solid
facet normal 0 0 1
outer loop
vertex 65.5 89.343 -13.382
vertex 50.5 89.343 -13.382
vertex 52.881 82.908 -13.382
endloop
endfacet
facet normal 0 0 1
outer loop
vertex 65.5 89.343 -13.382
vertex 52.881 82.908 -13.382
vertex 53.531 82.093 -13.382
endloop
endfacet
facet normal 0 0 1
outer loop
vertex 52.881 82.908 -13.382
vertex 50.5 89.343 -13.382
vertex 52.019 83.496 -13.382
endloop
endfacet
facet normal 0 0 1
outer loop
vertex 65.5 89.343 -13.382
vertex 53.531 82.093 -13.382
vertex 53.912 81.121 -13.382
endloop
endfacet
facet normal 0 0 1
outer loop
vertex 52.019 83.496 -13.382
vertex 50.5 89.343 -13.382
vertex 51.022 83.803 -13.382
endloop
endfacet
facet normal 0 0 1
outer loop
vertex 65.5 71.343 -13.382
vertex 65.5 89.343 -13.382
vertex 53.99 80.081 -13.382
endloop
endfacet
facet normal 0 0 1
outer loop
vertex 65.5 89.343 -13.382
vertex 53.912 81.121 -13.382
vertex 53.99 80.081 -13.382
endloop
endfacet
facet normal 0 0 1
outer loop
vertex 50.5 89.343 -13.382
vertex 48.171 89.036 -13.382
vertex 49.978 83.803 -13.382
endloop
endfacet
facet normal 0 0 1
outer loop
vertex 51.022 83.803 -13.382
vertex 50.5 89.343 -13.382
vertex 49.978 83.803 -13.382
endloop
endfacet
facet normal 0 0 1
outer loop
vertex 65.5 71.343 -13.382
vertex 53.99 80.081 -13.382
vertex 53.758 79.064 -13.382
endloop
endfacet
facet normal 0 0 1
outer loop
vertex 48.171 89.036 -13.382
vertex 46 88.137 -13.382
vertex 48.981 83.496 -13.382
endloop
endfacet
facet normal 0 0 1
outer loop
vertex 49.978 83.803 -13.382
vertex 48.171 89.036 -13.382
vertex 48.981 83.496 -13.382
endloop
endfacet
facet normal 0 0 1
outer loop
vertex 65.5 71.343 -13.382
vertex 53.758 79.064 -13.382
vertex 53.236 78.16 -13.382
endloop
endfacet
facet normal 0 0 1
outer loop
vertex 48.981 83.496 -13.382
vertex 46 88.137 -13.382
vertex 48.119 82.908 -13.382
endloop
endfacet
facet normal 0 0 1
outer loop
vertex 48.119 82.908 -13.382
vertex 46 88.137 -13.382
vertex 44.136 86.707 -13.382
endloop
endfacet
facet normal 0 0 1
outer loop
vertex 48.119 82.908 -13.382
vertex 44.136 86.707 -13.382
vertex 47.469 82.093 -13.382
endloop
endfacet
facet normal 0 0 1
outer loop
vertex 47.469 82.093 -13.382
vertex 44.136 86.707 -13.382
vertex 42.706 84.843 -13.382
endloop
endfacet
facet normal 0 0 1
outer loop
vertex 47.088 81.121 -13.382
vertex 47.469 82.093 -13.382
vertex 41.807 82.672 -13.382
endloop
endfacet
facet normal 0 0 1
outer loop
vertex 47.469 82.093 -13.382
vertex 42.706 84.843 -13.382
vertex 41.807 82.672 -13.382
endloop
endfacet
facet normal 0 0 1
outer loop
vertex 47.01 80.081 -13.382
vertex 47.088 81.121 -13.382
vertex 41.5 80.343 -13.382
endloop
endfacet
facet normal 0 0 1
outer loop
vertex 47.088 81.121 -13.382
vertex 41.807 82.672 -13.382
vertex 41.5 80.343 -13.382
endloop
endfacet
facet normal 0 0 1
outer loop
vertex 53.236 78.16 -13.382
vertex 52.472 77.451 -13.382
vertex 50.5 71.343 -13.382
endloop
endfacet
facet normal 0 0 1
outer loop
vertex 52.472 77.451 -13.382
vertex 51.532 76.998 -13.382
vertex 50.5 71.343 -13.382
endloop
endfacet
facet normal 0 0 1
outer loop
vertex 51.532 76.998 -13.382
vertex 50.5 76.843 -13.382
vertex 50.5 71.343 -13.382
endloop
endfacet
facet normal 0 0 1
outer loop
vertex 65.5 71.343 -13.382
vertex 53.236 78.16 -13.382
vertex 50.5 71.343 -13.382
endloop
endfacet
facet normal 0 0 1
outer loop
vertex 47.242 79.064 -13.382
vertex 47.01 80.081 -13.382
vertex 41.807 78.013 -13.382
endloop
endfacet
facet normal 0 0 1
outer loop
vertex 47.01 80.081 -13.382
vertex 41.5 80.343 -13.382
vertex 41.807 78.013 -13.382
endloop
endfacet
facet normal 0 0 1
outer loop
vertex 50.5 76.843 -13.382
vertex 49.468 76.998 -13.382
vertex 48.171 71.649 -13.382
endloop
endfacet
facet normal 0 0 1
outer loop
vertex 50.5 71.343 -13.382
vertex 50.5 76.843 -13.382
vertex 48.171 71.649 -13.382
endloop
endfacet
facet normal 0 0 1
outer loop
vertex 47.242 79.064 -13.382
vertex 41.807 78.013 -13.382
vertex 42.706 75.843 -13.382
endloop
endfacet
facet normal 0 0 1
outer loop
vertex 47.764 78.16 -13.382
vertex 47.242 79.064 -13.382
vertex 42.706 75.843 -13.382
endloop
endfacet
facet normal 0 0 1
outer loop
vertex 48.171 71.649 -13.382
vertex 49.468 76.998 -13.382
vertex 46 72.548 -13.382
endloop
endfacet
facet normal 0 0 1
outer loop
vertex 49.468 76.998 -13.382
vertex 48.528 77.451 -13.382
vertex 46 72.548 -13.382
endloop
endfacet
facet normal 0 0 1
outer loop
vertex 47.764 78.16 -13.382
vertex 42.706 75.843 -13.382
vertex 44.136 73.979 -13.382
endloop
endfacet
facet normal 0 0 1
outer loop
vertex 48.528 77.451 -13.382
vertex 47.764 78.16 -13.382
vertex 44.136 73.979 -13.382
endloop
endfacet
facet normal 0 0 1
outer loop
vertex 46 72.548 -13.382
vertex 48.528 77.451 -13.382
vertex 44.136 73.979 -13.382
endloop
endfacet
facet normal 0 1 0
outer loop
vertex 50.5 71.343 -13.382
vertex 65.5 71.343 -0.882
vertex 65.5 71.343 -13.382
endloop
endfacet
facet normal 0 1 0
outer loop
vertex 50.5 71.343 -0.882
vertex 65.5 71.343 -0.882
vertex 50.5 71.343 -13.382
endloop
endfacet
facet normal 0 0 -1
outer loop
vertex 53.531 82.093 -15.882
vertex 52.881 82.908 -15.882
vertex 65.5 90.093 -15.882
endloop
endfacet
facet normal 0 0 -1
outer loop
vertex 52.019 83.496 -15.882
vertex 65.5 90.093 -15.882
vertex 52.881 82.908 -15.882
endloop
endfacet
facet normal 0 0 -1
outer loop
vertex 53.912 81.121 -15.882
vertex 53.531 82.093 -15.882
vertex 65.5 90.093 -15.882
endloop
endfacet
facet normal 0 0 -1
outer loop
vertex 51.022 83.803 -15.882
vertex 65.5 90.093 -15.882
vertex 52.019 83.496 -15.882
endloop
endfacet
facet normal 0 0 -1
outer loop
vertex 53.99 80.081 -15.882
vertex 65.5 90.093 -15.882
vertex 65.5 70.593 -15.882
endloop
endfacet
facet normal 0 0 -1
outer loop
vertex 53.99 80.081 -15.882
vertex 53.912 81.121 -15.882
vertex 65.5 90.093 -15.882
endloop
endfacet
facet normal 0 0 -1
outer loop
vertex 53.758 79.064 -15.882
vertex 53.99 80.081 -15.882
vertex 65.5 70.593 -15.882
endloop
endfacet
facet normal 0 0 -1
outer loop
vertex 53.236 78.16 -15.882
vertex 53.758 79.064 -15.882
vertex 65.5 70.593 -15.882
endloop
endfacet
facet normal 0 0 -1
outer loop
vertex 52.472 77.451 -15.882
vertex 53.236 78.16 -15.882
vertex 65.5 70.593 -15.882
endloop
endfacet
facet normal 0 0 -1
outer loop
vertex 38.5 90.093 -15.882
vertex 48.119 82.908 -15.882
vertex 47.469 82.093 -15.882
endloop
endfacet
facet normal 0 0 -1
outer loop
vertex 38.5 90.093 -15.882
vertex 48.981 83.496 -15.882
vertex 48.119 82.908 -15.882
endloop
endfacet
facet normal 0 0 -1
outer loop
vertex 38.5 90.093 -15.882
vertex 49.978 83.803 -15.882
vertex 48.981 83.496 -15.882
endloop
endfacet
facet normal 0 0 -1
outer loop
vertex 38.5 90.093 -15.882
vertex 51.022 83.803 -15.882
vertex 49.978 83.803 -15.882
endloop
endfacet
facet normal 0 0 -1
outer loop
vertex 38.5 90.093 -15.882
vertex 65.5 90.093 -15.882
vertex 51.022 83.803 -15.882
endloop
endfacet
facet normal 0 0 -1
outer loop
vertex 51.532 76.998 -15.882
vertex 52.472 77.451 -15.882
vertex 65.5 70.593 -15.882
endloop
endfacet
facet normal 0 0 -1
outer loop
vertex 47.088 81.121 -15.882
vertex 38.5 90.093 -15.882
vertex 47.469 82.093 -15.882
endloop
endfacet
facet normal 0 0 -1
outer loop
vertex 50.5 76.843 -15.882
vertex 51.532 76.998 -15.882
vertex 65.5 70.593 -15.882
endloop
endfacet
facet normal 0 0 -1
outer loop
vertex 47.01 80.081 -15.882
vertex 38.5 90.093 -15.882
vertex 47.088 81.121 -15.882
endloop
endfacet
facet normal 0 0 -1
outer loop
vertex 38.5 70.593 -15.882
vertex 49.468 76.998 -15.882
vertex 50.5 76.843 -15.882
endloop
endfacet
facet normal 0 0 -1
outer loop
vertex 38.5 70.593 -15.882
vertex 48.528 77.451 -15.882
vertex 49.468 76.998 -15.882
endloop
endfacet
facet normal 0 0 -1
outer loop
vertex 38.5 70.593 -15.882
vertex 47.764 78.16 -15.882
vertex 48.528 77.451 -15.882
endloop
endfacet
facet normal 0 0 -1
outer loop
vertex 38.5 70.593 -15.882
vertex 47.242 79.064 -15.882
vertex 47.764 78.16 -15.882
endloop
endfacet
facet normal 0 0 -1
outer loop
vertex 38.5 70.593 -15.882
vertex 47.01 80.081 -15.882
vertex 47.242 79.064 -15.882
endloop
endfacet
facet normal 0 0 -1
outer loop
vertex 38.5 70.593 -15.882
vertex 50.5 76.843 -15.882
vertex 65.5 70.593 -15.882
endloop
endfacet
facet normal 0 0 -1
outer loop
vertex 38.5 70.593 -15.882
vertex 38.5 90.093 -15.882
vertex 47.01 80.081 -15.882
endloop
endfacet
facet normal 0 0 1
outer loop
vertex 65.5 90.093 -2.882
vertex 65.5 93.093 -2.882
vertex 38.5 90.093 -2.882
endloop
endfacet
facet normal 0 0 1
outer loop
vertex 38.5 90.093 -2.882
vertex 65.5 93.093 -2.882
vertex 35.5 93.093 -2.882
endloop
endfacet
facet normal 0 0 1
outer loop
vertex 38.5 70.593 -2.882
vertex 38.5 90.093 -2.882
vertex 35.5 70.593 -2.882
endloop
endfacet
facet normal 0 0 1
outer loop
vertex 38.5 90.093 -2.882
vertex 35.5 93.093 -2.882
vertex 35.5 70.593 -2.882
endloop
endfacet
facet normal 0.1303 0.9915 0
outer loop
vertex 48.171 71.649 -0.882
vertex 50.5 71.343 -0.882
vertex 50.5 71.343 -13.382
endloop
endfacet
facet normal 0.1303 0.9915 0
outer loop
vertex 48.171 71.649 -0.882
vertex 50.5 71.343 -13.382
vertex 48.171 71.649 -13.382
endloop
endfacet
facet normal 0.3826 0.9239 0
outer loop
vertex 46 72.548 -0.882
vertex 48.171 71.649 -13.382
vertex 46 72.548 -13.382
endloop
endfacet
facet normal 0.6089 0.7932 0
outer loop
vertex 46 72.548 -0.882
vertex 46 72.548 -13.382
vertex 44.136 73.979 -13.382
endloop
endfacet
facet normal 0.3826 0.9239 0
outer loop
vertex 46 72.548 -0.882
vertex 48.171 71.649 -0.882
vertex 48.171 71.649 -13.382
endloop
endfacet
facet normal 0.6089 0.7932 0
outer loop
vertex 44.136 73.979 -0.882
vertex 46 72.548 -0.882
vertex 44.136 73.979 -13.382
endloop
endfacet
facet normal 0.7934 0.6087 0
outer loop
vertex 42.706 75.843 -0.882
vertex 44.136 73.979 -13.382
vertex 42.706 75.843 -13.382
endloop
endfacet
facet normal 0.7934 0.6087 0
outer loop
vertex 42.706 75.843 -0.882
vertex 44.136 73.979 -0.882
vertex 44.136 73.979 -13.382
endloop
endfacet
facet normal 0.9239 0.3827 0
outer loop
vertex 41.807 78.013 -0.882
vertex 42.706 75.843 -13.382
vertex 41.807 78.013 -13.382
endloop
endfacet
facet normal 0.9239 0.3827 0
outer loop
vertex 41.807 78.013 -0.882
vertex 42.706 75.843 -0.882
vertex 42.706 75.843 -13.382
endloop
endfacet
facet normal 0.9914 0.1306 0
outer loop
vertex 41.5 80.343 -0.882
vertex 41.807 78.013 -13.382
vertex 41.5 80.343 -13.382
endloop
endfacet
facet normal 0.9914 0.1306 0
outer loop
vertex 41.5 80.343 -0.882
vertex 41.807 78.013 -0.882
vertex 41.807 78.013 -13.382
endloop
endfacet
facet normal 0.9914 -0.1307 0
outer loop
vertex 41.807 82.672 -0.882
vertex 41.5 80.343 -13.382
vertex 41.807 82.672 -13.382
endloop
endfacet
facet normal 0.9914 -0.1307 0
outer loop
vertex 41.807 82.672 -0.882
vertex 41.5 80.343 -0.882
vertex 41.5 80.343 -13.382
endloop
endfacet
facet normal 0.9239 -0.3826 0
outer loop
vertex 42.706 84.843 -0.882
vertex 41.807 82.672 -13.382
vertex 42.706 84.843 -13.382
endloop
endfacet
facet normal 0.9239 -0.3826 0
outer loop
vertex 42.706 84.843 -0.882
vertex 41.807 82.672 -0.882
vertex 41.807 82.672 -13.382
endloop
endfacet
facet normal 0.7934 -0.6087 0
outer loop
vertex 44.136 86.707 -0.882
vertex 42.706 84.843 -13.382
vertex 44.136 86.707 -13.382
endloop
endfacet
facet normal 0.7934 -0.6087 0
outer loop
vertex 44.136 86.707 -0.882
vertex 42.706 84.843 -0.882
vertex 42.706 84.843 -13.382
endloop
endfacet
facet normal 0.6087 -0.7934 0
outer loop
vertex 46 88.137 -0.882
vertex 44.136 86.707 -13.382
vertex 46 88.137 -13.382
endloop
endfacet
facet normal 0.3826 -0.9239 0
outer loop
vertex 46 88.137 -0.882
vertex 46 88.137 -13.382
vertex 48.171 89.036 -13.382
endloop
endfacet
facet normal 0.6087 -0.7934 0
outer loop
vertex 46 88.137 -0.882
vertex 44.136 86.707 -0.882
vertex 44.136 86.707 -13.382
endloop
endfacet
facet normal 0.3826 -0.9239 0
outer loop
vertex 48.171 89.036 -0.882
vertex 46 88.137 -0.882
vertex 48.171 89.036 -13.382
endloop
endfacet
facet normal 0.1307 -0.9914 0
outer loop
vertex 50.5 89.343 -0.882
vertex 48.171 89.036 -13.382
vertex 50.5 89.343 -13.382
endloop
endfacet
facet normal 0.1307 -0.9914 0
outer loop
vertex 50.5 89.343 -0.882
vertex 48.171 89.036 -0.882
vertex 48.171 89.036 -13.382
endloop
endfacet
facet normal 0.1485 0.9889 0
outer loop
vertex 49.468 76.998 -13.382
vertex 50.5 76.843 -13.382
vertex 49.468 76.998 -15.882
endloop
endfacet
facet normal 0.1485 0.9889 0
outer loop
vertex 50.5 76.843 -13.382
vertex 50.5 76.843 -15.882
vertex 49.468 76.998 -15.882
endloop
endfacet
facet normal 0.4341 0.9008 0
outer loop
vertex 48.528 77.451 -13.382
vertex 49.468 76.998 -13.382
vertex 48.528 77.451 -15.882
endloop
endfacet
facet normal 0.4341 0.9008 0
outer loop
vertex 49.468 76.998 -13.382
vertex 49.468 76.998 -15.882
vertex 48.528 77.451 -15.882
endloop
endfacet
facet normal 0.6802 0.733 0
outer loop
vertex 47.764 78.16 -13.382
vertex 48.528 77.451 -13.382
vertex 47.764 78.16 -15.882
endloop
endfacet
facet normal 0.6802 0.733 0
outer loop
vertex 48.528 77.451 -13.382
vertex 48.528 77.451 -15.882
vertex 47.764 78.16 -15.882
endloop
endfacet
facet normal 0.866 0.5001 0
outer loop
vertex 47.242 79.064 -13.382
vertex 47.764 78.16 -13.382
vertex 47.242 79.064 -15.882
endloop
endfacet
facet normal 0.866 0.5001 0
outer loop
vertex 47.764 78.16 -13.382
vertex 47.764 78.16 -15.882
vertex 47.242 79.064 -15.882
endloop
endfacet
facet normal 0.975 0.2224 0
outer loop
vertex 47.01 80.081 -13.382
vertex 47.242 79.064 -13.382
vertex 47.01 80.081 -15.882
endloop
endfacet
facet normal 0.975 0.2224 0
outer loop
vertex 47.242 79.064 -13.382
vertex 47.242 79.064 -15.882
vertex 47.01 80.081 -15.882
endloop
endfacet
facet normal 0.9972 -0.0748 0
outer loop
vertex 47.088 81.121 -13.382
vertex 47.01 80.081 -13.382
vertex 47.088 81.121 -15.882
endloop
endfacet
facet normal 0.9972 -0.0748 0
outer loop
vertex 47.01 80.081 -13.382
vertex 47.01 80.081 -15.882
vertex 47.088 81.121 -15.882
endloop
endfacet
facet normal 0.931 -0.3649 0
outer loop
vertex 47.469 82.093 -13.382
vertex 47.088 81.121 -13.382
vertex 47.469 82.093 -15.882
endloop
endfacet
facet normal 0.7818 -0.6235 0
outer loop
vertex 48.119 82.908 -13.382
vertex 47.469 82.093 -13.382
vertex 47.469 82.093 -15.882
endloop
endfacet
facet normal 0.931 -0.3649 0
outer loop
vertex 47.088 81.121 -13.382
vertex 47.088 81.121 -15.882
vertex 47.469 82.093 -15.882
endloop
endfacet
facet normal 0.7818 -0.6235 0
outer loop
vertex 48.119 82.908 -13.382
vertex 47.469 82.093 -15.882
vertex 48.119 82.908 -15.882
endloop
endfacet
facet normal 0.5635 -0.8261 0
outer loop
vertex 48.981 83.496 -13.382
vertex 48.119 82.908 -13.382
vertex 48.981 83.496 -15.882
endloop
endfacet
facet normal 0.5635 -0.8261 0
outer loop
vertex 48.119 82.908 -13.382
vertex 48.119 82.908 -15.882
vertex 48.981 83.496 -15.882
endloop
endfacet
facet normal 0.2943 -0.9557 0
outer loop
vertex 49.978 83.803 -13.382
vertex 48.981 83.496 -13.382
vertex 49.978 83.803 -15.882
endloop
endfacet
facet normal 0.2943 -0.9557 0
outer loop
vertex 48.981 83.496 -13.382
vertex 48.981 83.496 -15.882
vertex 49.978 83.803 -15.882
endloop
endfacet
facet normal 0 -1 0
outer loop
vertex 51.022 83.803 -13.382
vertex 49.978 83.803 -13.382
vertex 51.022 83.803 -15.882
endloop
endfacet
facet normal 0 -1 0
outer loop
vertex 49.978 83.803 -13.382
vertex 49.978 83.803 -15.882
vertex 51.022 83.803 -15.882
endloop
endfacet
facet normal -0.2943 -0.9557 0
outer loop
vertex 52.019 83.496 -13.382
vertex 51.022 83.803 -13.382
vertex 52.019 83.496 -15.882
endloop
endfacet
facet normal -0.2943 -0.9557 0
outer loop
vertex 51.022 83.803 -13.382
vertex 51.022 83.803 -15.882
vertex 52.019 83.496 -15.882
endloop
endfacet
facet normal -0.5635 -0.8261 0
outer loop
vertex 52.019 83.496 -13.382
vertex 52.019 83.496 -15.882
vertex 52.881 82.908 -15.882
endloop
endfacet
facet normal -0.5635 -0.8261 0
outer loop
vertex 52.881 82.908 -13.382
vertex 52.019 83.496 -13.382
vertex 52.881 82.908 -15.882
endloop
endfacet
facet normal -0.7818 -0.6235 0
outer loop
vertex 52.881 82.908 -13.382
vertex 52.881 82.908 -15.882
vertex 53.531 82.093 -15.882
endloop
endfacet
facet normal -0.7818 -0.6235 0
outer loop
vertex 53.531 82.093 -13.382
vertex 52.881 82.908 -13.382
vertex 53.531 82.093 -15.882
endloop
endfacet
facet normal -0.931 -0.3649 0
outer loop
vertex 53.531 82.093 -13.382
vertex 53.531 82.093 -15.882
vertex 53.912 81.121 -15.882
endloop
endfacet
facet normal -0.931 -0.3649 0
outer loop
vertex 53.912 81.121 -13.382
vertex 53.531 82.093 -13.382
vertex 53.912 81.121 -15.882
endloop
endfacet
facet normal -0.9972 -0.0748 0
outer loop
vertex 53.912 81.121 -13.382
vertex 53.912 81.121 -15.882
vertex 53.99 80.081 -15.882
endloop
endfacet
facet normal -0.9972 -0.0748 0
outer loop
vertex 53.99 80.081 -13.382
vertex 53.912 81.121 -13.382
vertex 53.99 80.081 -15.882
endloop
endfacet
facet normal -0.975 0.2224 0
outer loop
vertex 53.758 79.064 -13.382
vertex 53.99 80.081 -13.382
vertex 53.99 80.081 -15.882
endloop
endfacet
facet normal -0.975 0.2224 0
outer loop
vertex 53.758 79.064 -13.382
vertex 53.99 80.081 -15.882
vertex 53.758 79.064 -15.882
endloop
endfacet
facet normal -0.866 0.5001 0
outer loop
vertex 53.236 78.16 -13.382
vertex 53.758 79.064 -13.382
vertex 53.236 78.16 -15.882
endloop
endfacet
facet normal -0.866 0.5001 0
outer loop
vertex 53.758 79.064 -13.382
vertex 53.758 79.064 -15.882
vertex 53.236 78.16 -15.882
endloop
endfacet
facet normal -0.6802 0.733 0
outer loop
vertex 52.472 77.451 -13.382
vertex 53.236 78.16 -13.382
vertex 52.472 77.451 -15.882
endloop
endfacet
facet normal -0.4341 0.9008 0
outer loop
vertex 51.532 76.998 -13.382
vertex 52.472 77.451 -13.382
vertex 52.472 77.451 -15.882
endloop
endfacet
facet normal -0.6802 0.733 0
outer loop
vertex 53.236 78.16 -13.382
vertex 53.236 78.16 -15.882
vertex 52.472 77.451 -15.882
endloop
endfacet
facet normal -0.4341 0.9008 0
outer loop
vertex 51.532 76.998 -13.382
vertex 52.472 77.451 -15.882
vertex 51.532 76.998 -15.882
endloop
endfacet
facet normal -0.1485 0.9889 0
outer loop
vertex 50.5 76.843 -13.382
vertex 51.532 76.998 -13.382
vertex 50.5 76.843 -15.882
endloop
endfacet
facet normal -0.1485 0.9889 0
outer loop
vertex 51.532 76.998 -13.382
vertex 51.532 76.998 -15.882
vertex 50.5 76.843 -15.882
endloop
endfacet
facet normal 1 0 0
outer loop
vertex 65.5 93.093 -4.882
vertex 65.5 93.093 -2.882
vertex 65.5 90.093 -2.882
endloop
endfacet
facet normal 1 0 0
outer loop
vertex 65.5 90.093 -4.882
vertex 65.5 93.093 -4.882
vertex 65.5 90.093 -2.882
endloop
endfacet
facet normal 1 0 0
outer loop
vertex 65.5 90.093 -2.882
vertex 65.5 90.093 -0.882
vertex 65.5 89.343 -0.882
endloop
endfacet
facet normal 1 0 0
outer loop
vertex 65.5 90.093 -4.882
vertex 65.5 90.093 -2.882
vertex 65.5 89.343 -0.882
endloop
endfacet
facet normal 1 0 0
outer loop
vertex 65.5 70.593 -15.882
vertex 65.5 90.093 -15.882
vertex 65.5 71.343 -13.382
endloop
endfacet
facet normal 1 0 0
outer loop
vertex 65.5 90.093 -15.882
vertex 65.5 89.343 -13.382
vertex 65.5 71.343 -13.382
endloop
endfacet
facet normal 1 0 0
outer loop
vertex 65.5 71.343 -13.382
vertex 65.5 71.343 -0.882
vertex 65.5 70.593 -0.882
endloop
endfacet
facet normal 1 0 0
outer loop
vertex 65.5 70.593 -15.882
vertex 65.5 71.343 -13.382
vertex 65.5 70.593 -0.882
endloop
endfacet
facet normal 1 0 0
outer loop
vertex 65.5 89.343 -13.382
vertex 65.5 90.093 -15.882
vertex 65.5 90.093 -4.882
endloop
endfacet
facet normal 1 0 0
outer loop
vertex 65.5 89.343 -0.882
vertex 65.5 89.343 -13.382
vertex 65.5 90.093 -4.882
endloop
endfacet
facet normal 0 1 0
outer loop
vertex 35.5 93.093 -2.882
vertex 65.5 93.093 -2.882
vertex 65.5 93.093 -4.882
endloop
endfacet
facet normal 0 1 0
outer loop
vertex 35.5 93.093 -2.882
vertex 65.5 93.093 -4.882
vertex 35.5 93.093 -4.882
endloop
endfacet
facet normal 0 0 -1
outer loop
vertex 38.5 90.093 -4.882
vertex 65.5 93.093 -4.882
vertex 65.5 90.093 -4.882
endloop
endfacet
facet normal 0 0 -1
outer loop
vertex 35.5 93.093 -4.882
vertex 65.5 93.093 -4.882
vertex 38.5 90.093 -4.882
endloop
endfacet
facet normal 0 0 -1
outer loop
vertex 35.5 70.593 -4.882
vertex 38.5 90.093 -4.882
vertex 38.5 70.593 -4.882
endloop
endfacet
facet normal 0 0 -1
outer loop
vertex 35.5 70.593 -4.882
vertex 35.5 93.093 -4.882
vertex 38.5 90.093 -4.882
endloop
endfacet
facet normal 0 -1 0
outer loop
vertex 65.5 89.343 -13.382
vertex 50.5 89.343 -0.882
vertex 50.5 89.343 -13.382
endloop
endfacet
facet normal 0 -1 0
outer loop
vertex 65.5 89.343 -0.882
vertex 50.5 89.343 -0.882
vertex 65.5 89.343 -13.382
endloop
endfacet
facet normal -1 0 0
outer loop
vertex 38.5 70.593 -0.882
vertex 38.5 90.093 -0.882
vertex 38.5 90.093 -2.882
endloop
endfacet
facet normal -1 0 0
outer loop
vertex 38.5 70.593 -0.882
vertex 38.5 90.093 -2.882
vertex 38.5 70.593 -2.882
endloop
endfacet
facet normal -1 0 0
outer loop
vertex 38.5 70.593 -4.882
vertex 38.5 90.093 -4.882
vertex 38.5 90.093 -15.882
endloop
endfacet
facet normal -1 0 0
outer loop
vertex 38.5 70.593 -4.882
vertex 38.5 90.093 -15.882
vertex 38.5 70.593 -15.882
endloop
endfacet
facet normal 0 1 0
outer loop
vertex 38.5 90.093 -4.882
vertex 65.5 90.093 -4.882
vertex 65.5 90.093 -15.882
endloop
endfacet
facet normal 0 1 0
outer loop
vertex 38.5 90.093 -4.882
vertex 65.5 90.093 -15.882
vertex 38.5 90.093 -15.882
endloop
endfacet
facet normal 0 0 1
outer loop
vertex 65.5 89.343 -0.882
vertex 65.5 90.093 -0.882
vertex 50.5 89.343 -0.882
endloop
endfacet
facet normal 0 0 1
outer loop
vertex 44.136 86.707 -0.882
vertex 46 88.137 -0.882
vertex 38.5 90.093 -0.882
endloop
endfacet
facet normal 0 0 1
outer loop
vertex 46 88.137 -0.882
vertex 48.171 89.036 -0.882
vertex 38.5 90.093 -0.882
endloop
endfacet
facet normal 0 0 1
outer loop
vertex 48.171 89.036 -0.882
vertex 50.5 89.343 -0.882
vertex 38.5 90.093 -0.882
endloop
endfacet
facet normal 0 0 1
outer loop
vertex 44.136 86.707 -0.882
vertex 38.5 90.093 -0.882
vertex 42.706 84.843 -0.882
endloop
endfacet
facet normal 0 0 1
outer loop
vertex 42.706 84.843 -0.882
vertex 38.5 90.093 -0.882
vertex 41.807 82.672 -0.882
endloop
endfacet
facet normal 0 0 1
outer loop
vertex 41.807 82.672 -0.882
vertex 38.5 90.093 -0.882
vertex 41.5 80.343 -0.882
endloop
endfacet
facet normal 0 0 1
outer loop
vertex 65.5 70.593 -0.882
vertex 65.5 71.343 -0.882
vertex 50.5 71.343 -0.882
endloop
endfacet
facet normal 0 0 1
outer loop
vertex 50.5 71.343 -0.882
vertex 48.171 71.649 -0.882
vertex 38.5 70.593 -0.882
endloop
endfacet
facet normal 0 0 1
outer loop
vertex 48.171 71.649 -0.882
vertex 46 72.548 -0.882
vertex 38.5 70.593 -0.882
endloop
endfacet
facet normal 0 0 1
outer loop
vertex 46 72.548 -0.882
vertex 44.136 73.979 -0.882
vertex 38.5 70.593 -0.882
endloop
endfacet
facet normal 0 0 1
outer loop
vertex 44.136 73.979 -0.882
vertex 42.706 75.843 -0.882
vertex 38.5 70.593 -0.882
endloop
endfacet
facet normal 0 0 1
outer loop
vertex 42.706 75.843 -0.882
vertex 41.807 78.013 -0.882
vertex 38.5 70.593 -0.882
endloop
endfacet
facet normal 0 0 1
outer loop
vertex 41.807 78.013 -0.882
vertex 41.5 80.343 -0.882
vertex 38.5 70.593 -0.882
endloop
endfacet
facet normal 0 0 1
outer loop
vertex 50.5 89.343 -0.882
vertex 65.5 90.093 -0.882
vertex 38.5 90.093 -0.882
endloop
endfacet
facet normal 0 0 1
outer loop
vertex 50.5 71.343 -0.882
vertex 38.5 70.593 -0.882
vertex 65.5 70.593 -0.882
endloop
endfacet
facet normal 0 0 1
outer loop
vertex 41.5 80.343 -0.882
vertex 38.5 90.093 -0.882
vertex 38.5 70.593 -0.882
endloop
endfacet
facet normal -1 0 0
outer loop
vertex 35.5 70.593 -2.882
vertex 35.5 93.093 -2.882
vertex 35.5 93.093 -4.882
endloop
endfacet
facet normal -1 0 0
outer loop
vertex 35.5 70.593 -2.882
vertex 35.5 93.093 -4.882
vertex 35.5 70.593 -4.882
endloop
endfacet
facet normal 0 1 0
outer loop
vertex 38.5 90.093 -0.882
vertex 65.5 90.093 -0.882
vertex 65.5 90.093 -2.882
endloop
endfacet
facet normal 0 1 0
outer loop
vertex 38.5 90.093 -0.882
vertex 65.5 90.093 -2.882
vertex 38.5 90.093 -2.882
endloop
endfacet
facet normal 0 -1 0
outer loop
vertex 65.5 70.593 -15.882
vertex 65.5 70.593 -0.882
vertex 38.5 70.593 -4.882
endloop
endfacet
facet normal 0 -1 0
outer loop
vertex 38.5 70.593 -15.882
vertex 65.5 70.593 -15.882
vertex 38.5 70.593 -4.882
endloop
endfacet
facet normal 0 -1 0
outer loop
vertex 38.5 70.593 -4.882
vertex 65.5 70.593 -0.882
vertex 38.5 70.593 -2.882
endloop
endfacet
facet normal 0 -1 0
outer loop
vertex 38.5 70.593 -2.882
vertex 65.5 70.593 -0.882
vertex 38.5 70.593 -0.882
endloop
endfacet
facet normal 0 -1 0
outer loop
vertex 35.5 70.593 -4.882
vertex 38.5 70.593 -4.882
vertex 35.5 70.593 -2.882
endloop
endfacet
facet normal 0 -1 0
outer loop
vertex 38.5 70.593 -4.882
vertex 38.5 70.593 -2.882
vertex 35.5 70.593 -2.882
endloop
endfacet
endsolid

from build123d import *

# Parameters (mm, degrees)
SKETCH047_W             = 19.5
SKETCH047_H             = 27
PAD028_DEPTH            = 15
SKETCH048_W             = 22.5
SKETCH048_H             = 30
PAD027_DEPTH            = 2
POCKET019_DEPTH         = 12.5
SKETCH046_R             = 3.5
POCKET018_DEPTH         = 50
BODY015_ROLL_ANGLE      = 180
BODY015_PLACEMENT_ANGLE = -90


with BuildPart() as part:
    # Sketch047 → Pad028 (new body)
    with BuildSketch(Plane.XY):
        with Locations((9.75, 13.5)):
            Rectangle(SKETCH047_W, SKETCH047_H)
    extrude(amount=PAD028_DEPTH)

    # Sketch048 → Pad027 (join)
    with BuildSketch(Plane.XY.offset(2)):
        with Locations((8.25, 15)):
            Rectangle(SKETCH048_W, SKETCH048_H)
    extrude(amount=PAD027_DEPTH)

    # Sketch045 → Pocket019 (cut)
    with BuildSketch(Plane.XY):
        with BuildLine():
            ThreePointArc((18.75, 15), (9.749994, 24), (0.75, 14.999989))
            Line((0.75, 14.999989), (0.75, 0))
            Line((0.75, 0), (18.75, 0))
            Line((18.75, 0), (18.75, 15))
        make_face()
    extrude(amount=POCKET019_DEPTH, mode=Mode.SUBTRACT)

    # Sketch046 → Pocket018 (cut, symmetric)
    with BuildSketch(Plane.XY):
        with Locations((9.75, 15)):
            Circle(SKETCH046_R)
    extrude(amount=POCKET018_DEPTH, both=True, mode=Mode.SUBTRACT)


with BuildPart() as part_1:
    # Body015 roll: moved
    add(part.part.rotate(Axis((0, 0, 0), (1, 0, 0)), BODY015_ROLL_ANGLE))


with BuildPart() as part_2:
    # Body015 placement: moved
    add(part_1.part.moved(Location((65.5, 90.092583, -0.881905))).rotate(Axis((65.5, 90.092583, -0.881905), (0, 0, 1)), BODY015_PLACEMENT_ANGLE))


solid = part_2.part
